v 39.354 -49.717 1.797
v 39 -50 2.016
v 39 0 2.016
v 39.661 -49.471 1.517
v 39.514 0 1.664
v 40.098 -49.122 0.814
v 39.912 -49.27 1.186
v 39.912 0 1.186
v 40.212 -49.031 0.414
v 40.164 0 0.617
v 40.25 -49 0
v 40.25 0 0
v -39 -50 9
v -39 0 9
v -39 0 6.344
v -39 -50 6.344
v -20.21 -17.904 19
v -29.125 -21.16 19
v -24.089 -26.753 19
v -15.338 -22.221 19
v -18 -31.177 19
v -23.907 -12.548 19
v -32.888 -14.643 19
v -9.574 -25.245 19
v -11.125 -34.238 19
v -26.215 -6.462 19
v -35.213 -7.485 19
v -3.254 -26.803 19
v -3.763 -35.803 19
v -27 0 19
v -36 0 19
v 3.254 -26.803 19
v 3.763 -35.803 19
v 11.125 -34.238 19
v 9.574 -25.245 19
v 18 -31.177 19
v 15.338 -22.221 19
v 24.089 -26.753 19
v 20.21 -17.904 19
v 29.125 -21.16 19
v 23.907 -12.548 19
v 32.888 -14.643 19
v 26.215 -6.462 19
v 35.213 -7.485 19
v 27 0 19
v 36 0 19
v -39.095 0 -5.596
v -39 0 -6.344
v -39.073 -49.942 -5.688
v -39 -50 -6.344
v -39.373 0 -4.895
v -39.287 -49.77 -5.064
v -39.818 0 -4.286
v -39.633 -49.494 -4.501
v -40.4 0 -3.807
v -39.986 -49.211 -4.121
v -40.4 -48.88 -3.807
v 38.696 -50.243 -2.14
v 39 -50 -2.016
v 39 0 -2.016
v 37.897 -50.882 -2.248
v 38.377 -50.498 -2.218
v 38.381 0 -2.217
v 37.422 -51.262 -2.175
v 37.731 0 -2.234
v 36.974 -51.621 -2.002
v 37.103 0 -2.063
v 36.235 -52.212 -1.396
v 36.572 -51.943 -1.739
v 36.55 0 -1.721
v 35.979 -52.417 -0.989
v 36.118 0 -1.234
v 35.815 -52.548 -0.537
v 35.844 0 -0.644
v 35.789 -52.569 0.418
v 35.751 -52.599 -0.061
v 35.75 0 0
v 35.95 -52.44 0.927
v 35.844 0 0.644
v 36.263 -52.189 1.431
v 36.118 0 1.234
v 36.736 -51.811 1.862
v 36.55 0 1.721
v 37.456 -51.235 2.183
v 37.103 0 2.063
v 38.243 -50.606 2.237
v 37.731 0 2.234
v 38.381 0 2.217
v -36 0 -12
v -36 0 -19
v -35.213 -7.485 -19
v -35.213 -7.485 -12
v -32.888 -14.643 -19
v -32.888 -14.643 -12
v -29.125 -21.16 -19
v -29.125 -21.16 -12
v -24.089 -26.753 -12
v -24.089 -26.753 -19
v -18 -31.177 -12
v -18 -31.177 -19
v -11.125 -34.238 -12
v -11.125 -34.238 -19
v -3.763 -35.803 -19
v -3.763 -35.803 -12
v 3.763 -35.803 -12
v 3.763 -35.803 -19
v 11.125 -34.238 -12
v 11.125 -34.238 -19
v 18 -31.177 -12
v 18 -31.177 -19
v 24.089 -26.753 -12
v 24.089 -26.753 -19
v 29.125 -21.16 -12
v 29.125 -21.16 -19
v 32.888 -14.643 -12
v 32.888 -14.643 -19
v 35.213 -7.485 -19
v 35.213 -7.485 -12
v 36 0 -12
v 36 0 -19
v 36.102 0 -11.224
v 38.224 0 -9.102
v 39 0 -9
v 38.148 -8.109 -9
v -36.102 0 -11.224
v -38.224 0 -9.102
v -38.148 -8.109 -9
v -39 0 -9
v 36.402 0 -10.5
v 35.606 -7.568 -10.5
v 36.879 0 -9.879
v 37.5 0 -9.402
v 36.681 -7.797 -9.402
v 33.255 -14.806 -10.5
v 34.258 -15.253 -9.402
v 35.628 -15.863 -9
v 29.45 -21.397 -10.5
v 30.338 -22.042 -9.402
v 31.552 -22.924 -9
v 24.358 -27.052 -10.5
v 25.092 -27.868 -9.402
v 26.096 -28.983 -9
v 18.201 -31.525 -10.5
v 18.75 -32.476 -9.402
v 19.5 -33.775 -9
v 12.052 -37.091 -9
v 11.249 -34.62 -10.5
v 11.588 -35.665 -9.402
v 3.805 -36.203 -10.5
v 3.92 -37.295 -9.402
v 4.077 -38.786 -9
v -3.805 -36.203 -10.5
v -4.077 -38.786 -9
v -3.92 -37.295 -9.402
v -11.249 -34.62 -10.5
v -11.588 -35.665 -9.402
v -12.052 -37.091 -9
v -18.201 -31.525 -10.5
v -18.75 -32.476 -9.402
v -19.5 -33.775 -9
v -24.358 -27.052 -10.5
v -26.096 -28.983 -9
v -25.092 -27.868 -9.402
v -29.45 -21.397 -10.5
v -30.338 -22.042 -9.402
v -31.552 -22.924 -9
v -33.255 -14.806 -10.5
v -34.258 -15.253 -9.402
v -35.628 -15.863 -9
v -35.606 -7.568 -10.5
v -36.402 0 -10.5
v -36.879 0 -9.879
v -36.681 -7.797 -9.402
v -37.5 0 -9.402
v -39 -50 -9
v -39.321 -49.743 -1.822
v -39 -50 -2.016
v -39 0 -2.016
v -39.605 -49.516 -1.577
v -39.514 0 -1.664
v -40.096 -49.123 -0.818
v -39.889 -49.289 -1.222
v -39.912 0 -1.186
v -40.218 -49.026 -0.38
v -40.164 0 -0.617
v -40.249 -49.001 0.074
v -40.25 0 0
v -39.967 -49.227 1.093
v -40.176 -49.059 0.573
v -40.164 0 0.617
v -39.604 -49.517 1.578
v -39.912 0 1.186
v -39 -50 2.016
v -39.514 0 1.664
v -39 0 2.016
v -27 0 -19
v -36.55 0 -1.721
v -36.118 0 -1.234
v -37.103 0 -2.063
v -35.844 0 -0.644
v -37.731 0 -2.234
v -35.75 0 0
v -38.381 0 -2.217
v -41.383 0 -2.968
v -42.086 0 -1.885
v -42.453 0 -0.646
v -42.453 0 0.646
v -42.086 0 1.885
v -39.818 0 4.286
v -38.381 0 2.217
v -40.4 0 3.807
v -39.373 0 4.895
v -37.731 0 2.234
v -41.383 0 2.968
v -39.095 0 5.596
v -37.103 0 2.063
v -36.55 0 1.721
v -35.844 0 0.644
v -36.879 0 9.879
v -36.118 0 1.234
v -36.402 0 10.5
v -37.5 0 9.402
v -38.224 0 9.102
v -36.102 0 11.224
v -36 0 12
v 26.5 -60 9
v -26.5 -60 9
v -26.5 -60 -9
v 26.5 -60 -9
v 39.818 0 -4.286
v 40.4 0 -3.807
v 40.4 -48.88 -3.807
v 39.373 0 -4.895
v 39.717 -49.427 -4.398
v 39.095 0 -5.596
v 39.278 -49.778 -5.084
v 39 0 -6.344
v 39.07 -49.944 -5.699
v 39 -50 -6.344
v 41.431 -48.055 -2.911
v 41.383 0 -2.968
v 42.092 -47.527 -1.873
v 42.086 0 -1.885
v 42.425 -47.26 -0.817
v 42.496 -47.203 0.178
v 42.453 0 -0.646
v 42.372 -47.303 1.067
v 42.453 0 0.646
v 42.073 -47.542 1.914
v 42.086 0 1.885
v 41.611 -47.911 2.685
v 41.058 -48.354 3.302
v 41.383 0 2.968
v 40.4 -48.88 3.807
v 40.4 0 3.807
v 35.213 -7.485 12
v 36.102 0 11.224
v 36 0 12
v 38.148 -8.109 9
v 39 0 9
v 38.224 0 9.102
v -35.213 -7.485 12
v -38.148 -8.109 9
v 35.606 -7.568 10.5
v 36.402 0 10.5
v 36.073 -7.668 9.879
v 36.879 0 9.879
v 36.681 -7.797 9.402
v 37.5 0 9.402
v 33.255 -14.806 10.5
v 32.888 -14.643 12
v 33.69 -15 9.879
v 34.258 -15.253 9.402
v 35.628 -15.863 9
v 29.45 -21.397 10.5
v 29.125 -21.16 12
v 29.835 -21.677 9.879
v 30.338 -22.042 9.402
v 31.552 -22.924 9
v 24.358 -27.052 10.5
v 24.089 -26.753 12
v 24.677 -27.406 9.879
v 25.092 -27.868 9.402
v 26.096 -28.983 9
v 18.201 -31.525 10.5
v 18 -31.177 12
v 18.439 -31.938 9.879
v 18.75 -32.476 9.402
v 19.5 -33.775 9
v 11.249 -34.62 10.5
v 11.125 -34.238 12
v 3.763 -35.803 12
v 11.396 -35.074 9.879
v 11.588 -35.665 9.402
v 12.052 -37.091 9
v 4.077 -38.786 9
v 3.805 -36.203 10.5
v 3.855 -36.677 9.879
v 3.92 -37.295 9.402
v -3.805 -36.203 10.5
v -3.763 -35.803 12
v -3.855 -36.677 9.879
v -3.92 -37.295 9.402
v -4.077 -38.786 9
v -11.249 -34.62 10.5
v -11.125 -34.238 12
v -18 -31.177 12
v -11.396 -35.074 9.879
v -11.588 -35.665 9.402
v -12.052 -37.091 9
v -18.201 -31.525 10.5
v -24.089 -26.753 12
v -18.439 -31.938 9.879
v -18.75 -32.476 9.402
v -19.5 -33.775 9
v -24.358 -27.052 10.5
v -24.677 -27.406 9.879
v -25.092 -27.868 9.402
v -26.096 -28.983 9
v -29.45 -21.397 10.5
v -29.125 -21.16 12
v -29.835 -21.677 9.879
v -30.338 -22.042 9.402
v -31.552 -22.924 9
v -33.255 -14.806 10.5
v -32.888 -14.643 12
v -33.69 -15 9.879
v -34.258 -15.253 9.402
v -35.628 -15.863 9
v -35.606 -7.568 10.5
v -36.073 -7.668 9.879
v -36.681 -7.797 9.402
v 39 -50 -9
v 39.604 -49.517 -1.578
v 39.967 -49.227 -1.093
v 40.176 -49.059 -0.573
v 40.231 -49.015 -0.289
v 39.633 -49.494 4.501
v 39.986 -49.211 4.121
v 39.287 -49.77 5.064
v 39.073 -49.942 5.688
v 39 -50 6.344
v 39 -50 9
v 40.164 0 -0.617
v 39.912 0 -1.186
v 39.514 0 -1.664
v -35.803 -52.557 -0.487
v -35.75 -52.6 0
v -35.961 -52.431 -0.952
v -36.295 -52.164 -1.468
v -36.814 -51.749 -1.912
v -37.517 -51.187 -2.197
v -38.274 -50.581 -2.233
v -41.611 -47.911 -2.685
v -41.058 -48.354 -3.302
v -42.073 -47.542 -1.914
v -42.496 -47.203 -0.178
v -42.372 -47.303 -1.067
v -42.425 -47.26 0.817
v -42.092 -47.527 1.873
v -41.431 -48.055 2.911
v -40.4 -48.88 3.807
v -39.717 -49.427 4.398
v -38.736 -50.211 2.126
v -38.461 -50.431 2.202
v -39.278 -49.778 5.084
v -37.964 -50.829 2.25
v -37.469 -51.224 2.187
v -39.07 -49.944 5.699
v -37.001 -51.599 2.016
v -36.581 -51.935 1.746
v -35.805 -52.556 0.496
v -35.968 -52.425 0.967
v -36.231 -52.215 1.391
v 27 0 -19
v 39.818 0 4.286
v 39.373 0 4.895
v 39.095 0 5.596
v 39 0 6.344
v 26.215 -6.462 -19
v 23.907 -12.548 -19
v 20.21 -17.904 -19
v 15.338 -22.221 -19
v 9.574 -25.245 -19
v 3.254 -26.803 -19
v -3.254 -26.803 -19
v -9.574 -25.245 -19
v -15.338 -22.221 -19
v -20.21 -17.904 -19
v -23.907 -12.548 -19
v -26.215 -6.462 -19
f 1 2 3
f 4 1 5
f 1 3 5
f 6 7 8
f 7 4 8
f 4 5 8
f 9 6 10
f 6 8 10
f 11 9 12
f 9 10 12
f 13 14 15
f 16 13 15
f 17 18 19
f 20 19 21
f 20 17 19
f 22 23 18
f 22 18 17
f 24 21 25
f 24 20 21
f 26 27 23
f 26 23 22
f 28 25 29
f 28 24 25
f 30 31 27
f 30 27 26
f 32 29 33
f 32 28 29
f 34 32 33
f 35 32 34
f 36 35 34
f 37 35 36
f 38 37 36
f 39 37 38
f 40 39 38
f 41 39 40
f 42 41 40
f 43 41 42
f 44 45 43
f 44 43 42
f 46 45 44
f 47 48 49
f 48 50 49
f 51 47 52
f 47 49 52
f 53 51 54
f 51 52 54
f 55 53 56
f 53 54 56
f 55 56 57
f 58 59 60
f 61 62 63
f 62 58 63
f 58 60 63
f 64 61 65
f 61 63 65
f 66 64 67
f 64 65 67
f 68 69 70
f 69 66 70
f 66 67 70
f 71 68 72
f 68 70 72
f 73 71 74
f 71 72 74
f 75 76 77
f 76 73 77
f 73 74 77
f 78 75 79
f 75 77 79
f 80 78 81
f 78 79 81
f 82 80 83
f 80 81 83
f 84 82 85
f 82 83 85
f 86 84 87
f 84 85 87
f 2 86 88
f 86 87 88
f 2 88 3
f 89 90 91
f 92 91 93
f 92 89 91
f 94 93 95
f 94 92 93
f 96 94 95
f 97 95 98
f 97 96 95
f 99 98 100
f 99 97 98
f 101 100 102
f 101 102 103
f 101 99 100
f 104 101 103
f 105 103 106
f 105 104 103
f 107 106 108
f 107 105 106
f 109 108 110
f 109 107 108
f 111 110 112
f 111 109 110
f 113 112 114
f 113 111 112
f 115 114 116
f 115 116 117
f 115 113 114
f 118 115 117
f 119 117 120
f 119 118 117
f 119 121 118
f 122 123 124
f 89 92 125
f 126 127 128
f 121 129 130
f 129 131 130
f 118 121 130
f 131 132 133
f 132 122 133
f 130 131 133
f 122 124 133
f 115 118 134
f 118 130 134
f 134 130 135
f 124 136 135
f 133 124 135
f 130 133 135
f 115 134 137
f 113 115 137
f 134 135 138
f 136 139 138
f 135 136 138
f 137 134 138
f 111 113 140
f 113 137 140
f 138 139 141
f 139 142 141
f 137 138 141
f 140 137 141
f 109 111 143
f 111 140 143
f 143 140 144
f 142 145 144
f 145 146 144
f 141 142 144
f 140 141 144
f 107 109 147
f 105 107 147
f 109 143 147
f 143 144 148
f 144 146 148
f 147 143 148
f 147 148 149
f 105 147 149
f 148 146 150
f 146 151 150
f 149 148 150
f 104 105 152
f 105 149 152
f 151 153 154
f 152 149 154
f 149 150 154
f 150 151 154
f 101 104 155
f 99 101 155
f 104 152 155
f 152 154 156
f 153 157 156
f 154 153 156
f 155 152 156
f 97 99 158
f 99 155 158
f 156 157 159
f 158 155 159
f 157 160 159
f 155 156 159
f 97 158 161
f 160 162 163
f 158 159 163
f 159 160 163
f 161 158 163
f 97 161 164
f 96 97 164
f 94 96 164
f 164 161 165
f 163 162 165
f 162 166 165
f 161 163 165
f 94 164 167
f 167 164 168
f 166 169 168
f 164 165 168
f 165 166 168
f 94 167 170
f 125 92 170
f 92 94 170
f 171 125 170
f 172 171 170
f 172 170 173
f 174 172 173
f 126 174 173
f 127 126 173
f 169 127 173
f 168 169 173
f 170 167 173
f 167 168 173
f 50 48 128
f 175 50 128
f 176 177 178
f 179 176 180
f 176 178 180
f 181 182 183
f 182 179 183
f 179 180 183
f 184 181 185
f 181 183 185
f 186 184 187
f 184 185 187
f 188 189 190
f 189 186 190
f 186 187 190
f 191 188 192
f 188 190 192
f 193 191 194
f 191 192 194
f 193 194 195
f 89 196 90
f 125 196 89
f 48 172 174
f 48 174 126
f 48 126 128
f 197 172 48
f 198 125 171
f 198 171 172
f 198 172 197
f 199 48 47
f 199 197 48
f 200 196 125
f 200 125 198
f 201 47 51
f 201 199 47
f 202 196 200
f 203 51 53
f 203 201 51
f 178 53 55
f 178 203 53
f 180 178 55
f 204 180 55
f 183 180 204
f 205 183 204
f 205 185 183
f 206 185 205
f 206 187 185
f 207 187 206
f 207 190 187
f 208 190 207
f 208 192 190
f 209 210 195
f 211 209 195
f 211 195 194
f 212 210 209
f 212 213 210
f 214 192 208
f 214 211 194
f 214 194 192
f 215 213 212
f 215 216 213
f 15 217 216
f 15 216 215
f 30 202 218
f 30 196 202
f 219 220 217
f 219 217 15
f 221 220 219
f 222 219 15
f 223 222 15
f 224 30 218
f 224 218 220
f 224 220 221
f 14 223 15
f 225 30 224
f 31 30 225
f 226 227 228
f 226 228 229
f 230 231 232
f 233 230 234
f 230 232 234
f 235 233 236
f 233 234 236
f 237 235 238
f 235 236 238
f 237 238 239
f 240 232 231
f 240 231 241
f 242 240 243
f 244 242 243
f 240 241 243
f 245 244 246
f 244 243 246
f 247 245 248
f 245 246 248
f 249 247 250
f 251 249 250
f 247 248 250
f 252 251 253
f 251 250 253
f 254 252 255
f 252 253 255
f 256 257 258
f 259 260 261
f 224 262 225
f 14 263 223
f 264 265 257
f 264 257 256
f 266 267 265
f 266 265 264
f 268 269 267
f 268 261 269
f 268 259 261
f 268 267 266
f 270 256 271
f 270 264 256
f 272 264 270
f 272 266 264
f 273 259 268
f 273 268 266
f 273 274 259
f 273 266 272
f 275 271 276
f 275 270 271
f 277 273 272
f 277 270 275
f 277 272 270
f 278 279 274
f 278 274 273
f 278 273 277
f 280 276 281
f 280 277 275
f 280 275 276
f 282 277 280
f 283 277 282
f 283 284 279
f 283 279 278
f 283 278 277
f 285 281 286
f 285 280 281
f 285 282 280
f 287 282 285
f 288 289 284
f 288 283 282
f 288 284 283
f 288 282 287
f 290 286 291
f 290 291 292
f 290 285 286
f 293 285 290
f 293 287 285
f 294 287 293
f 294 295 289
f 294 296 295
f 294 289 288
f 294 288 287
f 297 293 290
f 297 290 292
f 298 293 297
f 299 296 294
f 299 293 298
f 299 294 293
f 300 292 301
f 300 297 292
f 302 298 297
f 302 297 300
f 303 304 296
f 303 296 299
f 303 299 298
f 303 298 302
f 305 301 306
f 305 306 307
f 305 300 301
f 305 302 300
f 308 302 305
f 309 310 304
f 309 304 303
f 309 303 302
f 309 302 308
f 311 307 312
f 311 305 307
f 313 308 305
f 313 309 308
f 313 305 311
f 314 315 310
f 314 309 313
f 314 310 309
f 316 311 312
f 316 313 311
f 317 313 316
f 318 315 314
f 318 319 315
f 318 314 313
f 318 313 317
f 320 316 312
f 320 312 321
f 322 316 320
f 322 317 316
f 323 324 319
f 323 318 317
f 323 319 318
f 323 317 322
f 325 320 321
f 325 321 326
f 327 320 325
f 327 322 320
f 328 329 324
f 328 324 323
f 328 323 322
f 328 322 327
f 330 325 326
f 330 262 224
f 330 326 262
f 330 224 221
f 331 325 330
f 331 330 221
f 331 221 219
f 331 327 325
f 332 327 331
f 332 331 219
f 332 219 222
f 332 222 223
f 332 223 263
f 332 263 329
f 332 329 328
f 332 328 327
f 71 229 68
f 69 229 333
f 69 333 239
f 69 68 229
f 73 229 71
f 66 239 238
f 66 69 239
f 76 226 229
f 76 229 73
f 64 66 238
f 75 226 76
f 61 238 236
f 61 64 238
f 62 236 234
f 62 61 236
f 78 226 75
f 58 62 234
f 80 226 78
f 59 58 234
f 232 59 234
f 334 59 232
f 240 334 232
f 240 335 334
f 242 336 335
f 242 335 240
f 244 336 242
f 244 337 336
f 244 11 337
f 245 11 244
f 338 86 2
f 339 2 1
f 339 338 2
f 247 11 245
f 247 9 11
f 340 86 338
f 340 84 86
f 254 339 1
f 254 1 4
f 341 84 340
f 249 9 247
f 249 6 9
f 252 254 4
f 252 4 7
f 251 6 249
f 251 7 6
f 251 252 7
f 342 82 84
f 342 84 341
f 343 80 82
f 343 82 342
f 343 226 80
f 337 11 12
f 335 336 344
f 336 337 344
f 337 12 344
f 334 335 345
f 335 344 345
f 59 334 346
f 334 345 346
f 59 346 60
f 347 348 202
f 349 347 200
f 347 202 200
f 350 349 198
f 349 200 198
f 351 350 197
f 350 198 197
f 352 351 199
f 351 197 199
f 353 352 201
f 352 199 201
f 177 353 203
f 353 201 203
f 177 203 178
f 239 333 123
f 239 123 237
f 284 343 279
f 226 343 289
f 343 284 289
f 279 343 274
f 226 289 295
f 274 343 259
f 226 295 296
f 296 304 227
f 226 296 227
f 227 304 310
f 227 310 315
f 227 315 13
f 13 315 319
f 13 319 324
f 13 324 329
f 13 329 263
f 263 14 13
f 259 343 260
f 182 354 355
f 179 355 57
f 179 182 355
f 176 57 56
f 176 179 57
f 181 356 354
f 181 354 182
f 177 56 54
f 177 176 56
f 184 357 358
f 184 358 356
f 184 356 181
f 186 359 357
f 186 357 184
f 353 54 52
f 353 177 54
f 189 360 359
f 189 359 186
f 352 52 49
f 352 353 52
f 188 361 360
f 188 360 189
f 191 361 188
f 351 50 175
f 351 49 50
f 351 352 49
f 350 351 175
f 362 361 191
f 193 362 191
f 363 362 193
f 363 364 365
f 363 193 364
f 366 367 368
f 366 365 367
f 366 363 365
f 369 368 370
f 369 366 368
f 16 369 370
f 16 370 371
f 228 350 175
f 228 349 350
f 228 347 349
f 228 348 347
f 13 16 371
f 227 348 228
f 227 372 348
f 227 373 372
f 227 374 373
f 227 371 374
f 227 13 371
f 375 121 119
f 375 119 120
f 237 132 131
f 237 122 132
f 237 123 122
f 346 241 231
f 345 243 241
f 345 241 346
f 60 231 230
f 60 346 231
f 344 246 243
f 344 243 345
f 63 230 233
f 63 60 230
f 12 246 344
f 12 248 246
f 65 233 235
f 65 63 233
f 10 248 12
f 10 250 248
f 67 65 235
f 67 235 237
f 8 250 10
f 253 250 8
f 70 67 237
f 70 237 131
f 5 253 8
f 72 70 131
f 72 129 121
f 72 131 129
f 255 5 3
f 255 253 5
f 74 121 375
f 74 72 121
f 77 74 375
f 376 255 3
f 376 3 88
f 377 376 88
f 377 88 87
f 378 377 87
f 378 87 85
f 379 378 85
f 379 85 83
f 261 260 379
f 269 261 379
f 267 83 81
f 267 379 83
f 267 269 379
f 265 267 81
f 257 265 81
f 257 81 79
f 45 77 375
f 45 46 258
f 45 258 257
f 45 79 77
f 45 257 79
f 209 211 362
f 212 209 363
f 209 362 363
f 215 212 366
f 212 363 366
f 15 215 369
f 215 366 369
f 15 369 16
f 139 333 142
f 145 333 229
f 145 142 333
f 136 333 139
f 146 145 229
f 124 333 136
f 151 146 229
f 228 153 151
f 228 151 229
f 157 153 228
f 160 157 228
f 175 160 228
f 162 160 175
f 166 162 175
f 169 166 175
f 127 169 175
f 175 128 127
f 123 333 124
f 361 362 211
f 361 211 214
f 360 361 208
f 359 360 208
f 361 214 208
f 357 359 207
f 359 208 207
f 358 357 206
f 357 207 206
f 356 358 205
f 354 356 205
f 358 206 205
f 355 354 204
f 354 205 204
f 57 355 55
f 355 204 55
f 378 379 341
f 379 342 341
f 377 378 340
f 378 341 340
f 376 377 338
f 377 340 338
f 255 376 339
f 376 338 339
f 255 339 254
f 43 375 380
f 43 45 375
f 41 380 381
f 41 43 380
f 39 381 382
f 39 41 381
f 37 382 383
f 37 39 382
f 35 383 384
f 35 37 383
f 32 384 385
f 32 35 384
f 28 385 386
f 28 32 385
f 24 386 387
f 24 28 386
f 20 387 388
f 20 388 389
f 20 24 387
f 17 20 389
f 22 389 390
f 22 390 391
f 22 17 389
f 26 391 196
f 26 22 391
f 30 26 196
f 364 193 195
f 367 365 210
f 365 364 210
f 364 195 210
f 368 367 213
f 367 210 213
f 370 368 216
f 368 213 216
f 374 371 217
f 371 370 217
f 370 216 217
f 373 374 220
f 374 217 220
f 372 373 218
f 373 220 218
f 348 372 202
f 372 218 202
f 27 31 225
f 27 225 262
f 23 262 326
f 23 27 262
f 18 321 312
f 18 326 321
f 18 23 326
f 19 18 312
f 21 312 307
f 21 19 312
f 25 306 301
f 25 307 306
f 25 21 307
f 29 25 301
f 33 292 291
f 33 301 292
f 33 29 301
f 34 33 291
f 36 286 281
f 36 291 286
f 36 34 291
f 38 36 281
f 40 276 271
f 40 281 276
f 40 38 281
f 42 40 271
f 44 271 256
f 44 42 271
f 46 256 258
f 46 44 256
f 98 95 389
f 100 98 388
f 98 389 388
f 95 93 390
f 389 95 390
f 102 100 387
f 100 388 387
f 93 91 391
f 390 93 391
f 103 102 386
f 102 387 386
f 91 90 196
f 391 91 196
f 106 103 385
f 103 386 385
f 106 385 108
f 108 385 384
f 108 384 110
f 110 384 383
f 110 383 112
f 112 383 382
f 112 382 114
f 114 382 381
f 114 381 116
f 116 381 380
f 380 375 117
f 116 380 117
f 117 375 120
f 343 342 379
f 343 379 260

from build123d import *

# Parameters (mm, degrees)
BOSS_EXTRUDE1_DEPTH = 19
BOSS_EXTRUDE2_DEPTH = 9
FILLET5_R           = 3
CUT_EXTRUDE2_REACH  = 83.322
FILLET6_R           = 3


with BuildPart() as part:
    # Sketch1 → Boss-Extrude1 (new, symmetric)
    with BuildSketch(Plane.XY):
        with BuildLine():
            ThreePointArc((27, 0), (0, -27), (-27, 0))
            Line((-27, 0), (-36, 0))
            ThreePointArc((-36, 0), (0, -36), (36, 0))
            Line((36, 0), (27, 0))
        make_face()
    extrude(amount=BOSS_EXTRUDE1_DEPTH, both=True)

    # Sketch1<3> → Boss-Extrude2 (add, symmetric)
    with BuildSketch(Plane.XY):
        Polygon((-51.5, 0), (-39, 0), (-39, -50), (-51.5, -40), align=None)
        Polygon((39, -50), (51.5, -40), (51.5, 0), (39, 0), align=None)
        with BuildLine():
            ThreePointArc((36, 0), (0, -36), (-36, 0))
            Line((-36, 0), (-39, 0))
            Line((-39, 0), (-39, -50))
            Line((-39, -50), (-26.5, -60))
            Line((-26.5, -60), (26.5, -60))
            Line((26.5, -60), (39, -50))
            Line((39, -50), (39, 0))
            Line((39, 0), (36, 0))
        make_face()
    extrude(amount=BOSS_EXTRUDE2_DEPTH, both=True)

    # Fillet5
    fillet5_edges = [part.edges().sort_by_distance(p)[0] for p in [
        (0, -36, -9),
        (0, -36, 9),
    ]]
    fillet(fillet5_edges, radius=FILLET5_R)

    # Sketch2 → Cut-Extrude2 (cut, up to next)
    with BuildSketch(Plane(origin=(0, 0, 0), x_dir=(1, 0, 0), z_dir=(0, 1, 0)), mode=Mode.PRIVATE) as cut_extrude2_sk1:
        with BuildLine():
            Line((-39, 4.387482194), (-39, 9))
            Line((-39, 9), (-51.5, 9))
            Line((-51.5, 9), (-51.5, -9))
            Line((-51.5, -9), (-39, -9))
            Line((-39, -9), (-39, -4.387482194))
            ThreePointArc((-39, -4.387482194), (-42.5, 0), (-39, 4.387482194))
        make_face()
    cut_extrude2_tool1 = extrude(cut_extrude2_sk1.sketch, amount=-CUT_EXTRUDE2_REACH, mode=Mode.PRIVATE) & part.part
    # Sketch2 → Cut-Extrude2 (cut, up to next)
    with BuildSketch(Plane(origin=(0, 0, 0), x_dir=(1, 0, 0), z_dir=(0, 1, 0)), mode=Mode.PRIVATE) as cut_extrude2_sk2:
        with BuildLine():
            Line((51.5, 9), (39, 9))
            Line((39, 9), (39, 4.387482194))
            ThreePointArc((39, 4.387482194), (42.5, 0), (39, -4.387482194))
            Line((39, -4.387482194), (39, -9))
            Line((39, -9), (51.5, -9))
            Line((51.5, -9), (51.5, 9))
        make_face()
    cut_extrude2_tool2 = extrude(cut_extrude2_sk2.sketch, amount=-CUT_EXTRUDE2_REACH, mode=Mode.PRIVATE) & part.part
    # Sketch2 → Cut-Extrude2 (cut, up to next)
    with BuildSketch(Plane(origin=(0, 0, 0), x_dir=(1, 0, 0), z_dir=(0, 1, 0)), mode=Mode.PRIVATE) as cut_extrude2_sk3:
        with BuildLine():
            ThreePointArc((40.25, 0), (39.912132318, 1.185854123), (39, 2.015564437))
            Line((39, 2.015564437), (39, -2.015564437))
            ThreePointArc((39, -2.015564437), (39.912132318, -1.185854123), (40.25, 0))
        make_face()
    cut_extrude2_tool3 = extrude(cut_extrude2_sk3.sketch, amount=-CUT_EXTRUDE2_REACH, mode=Mode.PRIVATE) & part.part
    # Sketch2 → Cut-Extrude2 (cut, up to next)
    with BuildSketch(Plane(origin=(0, 0, 0), x_dir=(1, 0, 0), z_dir=(0, 1, 0)), mode=Mode.PRIVATE) as cut_extrude2_sk4:
        with BuildLine():
            Line((39, -2.015564437), (39, 2.015564437))
            ThreePointArc((39, 2.015564437), (35.75, 0), (39, -2.015564437))
        make_face()
    cut_extrude2_tool4 = extrude(cut_extrude2_sk4.sketch, amount=-CUT_EXTRUDE2_REACH, mode=Mode.PRIVATE) & part.part
    # Sketch2 → Cut-Extrude2 (cut, up to next)
    with BuildSketch(Plane(origin=(0, 0, 0), x_dir=(1, 0, 0), z_dir=(0, 1, 0)), mode=Mode.PRIVATE) as cut_extrude2_sk5:
        with BuildLine():
            ThreePointArc((-35.75, 0), (-36.814145877, 1.912132318), (-39, 2.015564437))
            Line((-39, 2.015564437), (-39, -2.015564437))
            ThreePointArc((-39, -2.015564437), (-36.814145877, -1.912132318), (-35.75, 0))
        make_face()
    cut_extrude2_tool5 = extrude(cut_extrude2_sk5.sketch, amount=-CUT_EXTRUDE2_REACH, mode=Mode.PRIVATE) & part.part
    # Sketch2 → Cut-Extrude2 (cut, up to next)
    with BuildSketch(Plane(origin=(0, 0, 0), x_dir=(1, 0, 0), z_dir=(0, 1, 0)), mode=Mode.PRIVATE) as cut_extrude2_sk6:
        with BuildLine():
            Line((-39, -2.015564437), (-39, 2.015564437))
            ThreePointArc((-39, 2.015564437), (-40.25, 0), (-39, -2.015564437))
        make_face()
    cut_extrude2_tool6 = extrude(cut_extrude2_sk6.sketch, amount=-CUT_EXTRUDE2_REACH, mode=Mode.PRIVATE) & part.part
    # Sketch2 → Cut-Extrude2 (cut, up to next)
    with BuildSketch(Plane(origin=(0, 0, 0), x_dir=(1, 0, 0), z_dir=(0, 1, 0)), mode=Mode.PRIVATE) as cut_extrude2_sk7:
        with BuildLine():
            ThreePointArc((-35.75, 0), (-36.814145877, 1.912132318), (-39, 2.015564437))
            Line((-39, 2.015564437), (-39, -2.015564437))
            ThreePointArc((-39, -2.015564437), (-36.814145877, -1.912132318), (-35.75, 0))
        make_face()
    cut_extrude2_tool7 = extrude(cut_extrude2_sk7.sketch, amount=-CUT_EXTRUDE2_REACH, mode=Mode.PRIVATE) & part.part
    # Sketch2 → Cut-Extrude2 (cut, up to next)
    with BuildSketch(Plane(origin=(0, 0, 0), x_dir=(1, 0, 0), z_dir=(0, 1, 0)), mode=Mode.PRIVATE) as cut_extrude2_sk8:
        with BuildLine():
            Line((-39, -2.015564437), (-39, 2.015564437))
            ThreePointArc((-39, 2.015564437), (-40.25, 0), (-39, -2.015564437))
        make_face()
    cut_extrude2_tool8 = extrude(cut_extrude2_sk8.sketch, amount=-CUT_EXTRUDE2_REACH, mode=Mode.PRIVATE) & part.part
    # Sketch2 → Cut-Extrude2 (cut, up to next)
    with BuildSketch(Plane(origin=(0, 0, 0), x_dir=(1, 0, 0), z_dir=(0, 1, 0)), mode=Mode.PRIVATE) as cut_extrude2_sk9:
        with BuildLine():
            ThreePointArc((40.25, 0), (39.912132318, 1.185854123), (39, 2.015564437))
            Line((39, 2.015564437), (39, -2.015564437))
            ThreePointArc((39, -2.015564437), (39.912132318, -1.185854123), (40.25, 0))
        make_face()
    cut_extrude2_tool9 = extrude(cut_extrude2_sk9.sketch, amount=-CUT_EXTRUDE2_REACH, mode=Mode.PRIVATE) & part.part
    # Sketch2 → Cut-Extrude2 (cut, up to next)
    with BuildSketch(Plane(origin=(0, 0, 0), x_dir=(1, 0, 0), z_dir=(0, 1, 0)), mode=Mode.PRIVATE) as cut_extrude2_sk10:
        with BuildLine():
            Line((39, -2.015564437), (39, 2.015564437))
            ThreePointArc((39, 2.015564437), (35.75, 0), (39, -2.015564437))
        make_face()
    cut_extrude2_tool10 = extrude(cut_extrude2_sk10.sketch, amount=-CUT_EXTRUDE2_REACH, mode=Mode.PRIVATE) & part.part
    add(cut_extrude2_tool1.solids().sort_by_distance((-45.792249, 0, 0))[0], mode=Mode.SUBTRACT)
    add(cut_extrude2_tool2.solids().sort_by_distance((45.792249, 0, 0))[0], mode=Mode.SUBTRACT)
    add(cut_extrude2_tool3.solids().sort_by_distance((39.51422, 0, 0))[0], mode=Mode.SUBTRACT)
    add(cut_extrude2_tool4.solids().sort_by_distance((37.556167, 0, 0))[0], mode=Mode.SUBTRACT)
    add(cut_extrude2_tool5.solids().sort_by_distance((-37.556167, 0, 0))[0], mode=Mode.SUBTRACT)
    add(cut_extrude2_tool6.solids().sort_by_distance((-39.51422, 0, 0))[0], mode=Mode.SUBTRACT)
    add(cut_extrude2_tool7.solids().sort_by_distance((-37.556167, 0, 0))[0], mode=Mode.SUBTRACT)
    add(cut_extrude2_tool8.solids().sort_by_distance((-39.51422, 0, 0))[0], mode=Mode.SUBTRACT)
    add(cut_extrude2_tool9.solids().sort_by_distance((39.51422, 0, 0))[0], mode=Mode.SUBTRACT)
    add(cut_extrude2_tool10.solids().sort_by_distance((37.556167, 0, 0))[0], mode=Mode.SUBTRACT)

    # Fillet6
    fillet6_edges = [part.edges().sort_by_distance(p)[0] for p in [
        (-39, -25, 4.387482194),
        (-39, -25, -4.387482194),
        (39, -25, -4.387482194),
        (39, -25, 4.387482194),
    ]]
    fillet(fillet6_edges, radius=FILLET6_R)


solid = part.part
